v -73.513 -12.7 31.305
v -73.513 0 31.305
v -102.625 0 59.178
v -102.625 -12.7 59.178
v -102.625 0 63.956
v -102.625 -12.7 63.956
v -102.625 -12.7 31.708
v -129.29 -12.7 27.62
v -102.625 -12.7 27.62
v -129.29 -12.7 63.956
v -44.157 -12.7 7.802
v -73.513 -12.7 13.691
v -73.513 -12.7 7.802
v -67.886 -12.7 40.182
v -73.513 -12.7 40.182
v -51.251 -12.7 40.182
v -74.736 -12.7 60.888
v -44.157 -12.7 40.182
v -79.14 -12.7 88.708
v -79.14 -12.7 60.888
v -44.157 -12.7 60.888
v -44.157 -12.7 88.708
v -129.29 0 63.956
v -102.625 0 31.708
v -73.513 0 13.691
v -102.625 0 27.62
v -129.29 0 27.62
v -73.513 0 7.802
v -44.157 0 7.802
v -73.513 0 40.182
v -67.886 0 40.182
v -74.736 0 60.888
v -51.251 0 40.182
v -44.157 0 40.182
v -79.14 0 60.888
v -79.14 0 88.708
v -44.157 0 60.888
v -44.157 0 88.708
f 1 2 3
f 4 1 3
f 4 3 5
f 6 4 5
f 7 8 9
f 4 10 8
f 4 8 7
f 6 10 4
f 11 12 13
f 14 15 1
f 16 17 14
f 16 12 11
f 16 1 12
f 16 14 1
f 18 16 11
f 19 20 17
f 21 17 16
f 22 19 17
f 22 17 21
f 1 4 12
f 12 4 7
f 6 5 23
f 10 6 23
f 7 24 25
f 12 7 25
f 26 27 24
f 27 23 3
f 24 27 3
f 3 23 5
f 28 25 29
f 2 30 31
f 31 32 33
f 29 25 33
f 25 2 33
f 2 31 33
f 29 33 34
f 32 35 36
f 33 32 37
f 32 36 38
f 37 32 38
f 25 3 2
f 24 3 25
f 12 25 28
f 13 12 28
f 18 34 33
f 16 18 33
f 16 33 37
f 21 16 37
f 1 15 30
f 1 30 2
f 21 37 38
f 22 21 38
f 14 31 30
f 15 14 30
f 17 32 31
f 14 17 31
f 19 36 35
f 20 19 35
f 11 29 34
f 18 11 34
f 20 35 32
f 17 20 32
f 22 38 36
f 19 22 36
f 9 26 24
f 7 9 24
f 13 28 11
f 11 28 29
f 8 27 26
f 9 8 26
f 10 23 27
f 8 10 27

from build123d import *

# Parameters (mm, degrees)
F1_DEPTH = 12.7


with BuildPart() as f1:
    # F0 (on Front) → F1 (new body)
    with BuildSketch(Plane.XZ):
        Polygon((-79.139665, 60.888402), (-74.736215, 60.888402), (-44.156749, 60.888402), (-44.156749, 88.708244), (-79.139665, 88.708244), align=None)
        Polygon((-102.624685, 63.956387), (-129.289985, 63.956387), (-129.289985, 27.619565), (-102.624685, 27.619565), (-102.624685, 31.707756), (-102.624685, 59.177574), align=None)
        Polygon((-73.513038, 40.182184), (-73.513038, 31.304672), (-73.513038, 13.690901), (-73.513038, 7.802445), (-44.156749, 7.802445), (-44.156749, 40.182184), (-51.251188, 40.182184), (-67.88642, 40.182184), align=None)
        Polygon((-73.513038, 31.304672), (-102.624685, 59.177574), (-102.624685, 31.707756), (-73.513038, 13.690901), align=None)
        Polygon((-74.736215, 60.888402), (-67.88642, 40.182184), (-51.251188, 40.182184), (-44.156749, 60.888402), align=None)
    extrude(amount=F1_DEPTH)


solid = f1.part
